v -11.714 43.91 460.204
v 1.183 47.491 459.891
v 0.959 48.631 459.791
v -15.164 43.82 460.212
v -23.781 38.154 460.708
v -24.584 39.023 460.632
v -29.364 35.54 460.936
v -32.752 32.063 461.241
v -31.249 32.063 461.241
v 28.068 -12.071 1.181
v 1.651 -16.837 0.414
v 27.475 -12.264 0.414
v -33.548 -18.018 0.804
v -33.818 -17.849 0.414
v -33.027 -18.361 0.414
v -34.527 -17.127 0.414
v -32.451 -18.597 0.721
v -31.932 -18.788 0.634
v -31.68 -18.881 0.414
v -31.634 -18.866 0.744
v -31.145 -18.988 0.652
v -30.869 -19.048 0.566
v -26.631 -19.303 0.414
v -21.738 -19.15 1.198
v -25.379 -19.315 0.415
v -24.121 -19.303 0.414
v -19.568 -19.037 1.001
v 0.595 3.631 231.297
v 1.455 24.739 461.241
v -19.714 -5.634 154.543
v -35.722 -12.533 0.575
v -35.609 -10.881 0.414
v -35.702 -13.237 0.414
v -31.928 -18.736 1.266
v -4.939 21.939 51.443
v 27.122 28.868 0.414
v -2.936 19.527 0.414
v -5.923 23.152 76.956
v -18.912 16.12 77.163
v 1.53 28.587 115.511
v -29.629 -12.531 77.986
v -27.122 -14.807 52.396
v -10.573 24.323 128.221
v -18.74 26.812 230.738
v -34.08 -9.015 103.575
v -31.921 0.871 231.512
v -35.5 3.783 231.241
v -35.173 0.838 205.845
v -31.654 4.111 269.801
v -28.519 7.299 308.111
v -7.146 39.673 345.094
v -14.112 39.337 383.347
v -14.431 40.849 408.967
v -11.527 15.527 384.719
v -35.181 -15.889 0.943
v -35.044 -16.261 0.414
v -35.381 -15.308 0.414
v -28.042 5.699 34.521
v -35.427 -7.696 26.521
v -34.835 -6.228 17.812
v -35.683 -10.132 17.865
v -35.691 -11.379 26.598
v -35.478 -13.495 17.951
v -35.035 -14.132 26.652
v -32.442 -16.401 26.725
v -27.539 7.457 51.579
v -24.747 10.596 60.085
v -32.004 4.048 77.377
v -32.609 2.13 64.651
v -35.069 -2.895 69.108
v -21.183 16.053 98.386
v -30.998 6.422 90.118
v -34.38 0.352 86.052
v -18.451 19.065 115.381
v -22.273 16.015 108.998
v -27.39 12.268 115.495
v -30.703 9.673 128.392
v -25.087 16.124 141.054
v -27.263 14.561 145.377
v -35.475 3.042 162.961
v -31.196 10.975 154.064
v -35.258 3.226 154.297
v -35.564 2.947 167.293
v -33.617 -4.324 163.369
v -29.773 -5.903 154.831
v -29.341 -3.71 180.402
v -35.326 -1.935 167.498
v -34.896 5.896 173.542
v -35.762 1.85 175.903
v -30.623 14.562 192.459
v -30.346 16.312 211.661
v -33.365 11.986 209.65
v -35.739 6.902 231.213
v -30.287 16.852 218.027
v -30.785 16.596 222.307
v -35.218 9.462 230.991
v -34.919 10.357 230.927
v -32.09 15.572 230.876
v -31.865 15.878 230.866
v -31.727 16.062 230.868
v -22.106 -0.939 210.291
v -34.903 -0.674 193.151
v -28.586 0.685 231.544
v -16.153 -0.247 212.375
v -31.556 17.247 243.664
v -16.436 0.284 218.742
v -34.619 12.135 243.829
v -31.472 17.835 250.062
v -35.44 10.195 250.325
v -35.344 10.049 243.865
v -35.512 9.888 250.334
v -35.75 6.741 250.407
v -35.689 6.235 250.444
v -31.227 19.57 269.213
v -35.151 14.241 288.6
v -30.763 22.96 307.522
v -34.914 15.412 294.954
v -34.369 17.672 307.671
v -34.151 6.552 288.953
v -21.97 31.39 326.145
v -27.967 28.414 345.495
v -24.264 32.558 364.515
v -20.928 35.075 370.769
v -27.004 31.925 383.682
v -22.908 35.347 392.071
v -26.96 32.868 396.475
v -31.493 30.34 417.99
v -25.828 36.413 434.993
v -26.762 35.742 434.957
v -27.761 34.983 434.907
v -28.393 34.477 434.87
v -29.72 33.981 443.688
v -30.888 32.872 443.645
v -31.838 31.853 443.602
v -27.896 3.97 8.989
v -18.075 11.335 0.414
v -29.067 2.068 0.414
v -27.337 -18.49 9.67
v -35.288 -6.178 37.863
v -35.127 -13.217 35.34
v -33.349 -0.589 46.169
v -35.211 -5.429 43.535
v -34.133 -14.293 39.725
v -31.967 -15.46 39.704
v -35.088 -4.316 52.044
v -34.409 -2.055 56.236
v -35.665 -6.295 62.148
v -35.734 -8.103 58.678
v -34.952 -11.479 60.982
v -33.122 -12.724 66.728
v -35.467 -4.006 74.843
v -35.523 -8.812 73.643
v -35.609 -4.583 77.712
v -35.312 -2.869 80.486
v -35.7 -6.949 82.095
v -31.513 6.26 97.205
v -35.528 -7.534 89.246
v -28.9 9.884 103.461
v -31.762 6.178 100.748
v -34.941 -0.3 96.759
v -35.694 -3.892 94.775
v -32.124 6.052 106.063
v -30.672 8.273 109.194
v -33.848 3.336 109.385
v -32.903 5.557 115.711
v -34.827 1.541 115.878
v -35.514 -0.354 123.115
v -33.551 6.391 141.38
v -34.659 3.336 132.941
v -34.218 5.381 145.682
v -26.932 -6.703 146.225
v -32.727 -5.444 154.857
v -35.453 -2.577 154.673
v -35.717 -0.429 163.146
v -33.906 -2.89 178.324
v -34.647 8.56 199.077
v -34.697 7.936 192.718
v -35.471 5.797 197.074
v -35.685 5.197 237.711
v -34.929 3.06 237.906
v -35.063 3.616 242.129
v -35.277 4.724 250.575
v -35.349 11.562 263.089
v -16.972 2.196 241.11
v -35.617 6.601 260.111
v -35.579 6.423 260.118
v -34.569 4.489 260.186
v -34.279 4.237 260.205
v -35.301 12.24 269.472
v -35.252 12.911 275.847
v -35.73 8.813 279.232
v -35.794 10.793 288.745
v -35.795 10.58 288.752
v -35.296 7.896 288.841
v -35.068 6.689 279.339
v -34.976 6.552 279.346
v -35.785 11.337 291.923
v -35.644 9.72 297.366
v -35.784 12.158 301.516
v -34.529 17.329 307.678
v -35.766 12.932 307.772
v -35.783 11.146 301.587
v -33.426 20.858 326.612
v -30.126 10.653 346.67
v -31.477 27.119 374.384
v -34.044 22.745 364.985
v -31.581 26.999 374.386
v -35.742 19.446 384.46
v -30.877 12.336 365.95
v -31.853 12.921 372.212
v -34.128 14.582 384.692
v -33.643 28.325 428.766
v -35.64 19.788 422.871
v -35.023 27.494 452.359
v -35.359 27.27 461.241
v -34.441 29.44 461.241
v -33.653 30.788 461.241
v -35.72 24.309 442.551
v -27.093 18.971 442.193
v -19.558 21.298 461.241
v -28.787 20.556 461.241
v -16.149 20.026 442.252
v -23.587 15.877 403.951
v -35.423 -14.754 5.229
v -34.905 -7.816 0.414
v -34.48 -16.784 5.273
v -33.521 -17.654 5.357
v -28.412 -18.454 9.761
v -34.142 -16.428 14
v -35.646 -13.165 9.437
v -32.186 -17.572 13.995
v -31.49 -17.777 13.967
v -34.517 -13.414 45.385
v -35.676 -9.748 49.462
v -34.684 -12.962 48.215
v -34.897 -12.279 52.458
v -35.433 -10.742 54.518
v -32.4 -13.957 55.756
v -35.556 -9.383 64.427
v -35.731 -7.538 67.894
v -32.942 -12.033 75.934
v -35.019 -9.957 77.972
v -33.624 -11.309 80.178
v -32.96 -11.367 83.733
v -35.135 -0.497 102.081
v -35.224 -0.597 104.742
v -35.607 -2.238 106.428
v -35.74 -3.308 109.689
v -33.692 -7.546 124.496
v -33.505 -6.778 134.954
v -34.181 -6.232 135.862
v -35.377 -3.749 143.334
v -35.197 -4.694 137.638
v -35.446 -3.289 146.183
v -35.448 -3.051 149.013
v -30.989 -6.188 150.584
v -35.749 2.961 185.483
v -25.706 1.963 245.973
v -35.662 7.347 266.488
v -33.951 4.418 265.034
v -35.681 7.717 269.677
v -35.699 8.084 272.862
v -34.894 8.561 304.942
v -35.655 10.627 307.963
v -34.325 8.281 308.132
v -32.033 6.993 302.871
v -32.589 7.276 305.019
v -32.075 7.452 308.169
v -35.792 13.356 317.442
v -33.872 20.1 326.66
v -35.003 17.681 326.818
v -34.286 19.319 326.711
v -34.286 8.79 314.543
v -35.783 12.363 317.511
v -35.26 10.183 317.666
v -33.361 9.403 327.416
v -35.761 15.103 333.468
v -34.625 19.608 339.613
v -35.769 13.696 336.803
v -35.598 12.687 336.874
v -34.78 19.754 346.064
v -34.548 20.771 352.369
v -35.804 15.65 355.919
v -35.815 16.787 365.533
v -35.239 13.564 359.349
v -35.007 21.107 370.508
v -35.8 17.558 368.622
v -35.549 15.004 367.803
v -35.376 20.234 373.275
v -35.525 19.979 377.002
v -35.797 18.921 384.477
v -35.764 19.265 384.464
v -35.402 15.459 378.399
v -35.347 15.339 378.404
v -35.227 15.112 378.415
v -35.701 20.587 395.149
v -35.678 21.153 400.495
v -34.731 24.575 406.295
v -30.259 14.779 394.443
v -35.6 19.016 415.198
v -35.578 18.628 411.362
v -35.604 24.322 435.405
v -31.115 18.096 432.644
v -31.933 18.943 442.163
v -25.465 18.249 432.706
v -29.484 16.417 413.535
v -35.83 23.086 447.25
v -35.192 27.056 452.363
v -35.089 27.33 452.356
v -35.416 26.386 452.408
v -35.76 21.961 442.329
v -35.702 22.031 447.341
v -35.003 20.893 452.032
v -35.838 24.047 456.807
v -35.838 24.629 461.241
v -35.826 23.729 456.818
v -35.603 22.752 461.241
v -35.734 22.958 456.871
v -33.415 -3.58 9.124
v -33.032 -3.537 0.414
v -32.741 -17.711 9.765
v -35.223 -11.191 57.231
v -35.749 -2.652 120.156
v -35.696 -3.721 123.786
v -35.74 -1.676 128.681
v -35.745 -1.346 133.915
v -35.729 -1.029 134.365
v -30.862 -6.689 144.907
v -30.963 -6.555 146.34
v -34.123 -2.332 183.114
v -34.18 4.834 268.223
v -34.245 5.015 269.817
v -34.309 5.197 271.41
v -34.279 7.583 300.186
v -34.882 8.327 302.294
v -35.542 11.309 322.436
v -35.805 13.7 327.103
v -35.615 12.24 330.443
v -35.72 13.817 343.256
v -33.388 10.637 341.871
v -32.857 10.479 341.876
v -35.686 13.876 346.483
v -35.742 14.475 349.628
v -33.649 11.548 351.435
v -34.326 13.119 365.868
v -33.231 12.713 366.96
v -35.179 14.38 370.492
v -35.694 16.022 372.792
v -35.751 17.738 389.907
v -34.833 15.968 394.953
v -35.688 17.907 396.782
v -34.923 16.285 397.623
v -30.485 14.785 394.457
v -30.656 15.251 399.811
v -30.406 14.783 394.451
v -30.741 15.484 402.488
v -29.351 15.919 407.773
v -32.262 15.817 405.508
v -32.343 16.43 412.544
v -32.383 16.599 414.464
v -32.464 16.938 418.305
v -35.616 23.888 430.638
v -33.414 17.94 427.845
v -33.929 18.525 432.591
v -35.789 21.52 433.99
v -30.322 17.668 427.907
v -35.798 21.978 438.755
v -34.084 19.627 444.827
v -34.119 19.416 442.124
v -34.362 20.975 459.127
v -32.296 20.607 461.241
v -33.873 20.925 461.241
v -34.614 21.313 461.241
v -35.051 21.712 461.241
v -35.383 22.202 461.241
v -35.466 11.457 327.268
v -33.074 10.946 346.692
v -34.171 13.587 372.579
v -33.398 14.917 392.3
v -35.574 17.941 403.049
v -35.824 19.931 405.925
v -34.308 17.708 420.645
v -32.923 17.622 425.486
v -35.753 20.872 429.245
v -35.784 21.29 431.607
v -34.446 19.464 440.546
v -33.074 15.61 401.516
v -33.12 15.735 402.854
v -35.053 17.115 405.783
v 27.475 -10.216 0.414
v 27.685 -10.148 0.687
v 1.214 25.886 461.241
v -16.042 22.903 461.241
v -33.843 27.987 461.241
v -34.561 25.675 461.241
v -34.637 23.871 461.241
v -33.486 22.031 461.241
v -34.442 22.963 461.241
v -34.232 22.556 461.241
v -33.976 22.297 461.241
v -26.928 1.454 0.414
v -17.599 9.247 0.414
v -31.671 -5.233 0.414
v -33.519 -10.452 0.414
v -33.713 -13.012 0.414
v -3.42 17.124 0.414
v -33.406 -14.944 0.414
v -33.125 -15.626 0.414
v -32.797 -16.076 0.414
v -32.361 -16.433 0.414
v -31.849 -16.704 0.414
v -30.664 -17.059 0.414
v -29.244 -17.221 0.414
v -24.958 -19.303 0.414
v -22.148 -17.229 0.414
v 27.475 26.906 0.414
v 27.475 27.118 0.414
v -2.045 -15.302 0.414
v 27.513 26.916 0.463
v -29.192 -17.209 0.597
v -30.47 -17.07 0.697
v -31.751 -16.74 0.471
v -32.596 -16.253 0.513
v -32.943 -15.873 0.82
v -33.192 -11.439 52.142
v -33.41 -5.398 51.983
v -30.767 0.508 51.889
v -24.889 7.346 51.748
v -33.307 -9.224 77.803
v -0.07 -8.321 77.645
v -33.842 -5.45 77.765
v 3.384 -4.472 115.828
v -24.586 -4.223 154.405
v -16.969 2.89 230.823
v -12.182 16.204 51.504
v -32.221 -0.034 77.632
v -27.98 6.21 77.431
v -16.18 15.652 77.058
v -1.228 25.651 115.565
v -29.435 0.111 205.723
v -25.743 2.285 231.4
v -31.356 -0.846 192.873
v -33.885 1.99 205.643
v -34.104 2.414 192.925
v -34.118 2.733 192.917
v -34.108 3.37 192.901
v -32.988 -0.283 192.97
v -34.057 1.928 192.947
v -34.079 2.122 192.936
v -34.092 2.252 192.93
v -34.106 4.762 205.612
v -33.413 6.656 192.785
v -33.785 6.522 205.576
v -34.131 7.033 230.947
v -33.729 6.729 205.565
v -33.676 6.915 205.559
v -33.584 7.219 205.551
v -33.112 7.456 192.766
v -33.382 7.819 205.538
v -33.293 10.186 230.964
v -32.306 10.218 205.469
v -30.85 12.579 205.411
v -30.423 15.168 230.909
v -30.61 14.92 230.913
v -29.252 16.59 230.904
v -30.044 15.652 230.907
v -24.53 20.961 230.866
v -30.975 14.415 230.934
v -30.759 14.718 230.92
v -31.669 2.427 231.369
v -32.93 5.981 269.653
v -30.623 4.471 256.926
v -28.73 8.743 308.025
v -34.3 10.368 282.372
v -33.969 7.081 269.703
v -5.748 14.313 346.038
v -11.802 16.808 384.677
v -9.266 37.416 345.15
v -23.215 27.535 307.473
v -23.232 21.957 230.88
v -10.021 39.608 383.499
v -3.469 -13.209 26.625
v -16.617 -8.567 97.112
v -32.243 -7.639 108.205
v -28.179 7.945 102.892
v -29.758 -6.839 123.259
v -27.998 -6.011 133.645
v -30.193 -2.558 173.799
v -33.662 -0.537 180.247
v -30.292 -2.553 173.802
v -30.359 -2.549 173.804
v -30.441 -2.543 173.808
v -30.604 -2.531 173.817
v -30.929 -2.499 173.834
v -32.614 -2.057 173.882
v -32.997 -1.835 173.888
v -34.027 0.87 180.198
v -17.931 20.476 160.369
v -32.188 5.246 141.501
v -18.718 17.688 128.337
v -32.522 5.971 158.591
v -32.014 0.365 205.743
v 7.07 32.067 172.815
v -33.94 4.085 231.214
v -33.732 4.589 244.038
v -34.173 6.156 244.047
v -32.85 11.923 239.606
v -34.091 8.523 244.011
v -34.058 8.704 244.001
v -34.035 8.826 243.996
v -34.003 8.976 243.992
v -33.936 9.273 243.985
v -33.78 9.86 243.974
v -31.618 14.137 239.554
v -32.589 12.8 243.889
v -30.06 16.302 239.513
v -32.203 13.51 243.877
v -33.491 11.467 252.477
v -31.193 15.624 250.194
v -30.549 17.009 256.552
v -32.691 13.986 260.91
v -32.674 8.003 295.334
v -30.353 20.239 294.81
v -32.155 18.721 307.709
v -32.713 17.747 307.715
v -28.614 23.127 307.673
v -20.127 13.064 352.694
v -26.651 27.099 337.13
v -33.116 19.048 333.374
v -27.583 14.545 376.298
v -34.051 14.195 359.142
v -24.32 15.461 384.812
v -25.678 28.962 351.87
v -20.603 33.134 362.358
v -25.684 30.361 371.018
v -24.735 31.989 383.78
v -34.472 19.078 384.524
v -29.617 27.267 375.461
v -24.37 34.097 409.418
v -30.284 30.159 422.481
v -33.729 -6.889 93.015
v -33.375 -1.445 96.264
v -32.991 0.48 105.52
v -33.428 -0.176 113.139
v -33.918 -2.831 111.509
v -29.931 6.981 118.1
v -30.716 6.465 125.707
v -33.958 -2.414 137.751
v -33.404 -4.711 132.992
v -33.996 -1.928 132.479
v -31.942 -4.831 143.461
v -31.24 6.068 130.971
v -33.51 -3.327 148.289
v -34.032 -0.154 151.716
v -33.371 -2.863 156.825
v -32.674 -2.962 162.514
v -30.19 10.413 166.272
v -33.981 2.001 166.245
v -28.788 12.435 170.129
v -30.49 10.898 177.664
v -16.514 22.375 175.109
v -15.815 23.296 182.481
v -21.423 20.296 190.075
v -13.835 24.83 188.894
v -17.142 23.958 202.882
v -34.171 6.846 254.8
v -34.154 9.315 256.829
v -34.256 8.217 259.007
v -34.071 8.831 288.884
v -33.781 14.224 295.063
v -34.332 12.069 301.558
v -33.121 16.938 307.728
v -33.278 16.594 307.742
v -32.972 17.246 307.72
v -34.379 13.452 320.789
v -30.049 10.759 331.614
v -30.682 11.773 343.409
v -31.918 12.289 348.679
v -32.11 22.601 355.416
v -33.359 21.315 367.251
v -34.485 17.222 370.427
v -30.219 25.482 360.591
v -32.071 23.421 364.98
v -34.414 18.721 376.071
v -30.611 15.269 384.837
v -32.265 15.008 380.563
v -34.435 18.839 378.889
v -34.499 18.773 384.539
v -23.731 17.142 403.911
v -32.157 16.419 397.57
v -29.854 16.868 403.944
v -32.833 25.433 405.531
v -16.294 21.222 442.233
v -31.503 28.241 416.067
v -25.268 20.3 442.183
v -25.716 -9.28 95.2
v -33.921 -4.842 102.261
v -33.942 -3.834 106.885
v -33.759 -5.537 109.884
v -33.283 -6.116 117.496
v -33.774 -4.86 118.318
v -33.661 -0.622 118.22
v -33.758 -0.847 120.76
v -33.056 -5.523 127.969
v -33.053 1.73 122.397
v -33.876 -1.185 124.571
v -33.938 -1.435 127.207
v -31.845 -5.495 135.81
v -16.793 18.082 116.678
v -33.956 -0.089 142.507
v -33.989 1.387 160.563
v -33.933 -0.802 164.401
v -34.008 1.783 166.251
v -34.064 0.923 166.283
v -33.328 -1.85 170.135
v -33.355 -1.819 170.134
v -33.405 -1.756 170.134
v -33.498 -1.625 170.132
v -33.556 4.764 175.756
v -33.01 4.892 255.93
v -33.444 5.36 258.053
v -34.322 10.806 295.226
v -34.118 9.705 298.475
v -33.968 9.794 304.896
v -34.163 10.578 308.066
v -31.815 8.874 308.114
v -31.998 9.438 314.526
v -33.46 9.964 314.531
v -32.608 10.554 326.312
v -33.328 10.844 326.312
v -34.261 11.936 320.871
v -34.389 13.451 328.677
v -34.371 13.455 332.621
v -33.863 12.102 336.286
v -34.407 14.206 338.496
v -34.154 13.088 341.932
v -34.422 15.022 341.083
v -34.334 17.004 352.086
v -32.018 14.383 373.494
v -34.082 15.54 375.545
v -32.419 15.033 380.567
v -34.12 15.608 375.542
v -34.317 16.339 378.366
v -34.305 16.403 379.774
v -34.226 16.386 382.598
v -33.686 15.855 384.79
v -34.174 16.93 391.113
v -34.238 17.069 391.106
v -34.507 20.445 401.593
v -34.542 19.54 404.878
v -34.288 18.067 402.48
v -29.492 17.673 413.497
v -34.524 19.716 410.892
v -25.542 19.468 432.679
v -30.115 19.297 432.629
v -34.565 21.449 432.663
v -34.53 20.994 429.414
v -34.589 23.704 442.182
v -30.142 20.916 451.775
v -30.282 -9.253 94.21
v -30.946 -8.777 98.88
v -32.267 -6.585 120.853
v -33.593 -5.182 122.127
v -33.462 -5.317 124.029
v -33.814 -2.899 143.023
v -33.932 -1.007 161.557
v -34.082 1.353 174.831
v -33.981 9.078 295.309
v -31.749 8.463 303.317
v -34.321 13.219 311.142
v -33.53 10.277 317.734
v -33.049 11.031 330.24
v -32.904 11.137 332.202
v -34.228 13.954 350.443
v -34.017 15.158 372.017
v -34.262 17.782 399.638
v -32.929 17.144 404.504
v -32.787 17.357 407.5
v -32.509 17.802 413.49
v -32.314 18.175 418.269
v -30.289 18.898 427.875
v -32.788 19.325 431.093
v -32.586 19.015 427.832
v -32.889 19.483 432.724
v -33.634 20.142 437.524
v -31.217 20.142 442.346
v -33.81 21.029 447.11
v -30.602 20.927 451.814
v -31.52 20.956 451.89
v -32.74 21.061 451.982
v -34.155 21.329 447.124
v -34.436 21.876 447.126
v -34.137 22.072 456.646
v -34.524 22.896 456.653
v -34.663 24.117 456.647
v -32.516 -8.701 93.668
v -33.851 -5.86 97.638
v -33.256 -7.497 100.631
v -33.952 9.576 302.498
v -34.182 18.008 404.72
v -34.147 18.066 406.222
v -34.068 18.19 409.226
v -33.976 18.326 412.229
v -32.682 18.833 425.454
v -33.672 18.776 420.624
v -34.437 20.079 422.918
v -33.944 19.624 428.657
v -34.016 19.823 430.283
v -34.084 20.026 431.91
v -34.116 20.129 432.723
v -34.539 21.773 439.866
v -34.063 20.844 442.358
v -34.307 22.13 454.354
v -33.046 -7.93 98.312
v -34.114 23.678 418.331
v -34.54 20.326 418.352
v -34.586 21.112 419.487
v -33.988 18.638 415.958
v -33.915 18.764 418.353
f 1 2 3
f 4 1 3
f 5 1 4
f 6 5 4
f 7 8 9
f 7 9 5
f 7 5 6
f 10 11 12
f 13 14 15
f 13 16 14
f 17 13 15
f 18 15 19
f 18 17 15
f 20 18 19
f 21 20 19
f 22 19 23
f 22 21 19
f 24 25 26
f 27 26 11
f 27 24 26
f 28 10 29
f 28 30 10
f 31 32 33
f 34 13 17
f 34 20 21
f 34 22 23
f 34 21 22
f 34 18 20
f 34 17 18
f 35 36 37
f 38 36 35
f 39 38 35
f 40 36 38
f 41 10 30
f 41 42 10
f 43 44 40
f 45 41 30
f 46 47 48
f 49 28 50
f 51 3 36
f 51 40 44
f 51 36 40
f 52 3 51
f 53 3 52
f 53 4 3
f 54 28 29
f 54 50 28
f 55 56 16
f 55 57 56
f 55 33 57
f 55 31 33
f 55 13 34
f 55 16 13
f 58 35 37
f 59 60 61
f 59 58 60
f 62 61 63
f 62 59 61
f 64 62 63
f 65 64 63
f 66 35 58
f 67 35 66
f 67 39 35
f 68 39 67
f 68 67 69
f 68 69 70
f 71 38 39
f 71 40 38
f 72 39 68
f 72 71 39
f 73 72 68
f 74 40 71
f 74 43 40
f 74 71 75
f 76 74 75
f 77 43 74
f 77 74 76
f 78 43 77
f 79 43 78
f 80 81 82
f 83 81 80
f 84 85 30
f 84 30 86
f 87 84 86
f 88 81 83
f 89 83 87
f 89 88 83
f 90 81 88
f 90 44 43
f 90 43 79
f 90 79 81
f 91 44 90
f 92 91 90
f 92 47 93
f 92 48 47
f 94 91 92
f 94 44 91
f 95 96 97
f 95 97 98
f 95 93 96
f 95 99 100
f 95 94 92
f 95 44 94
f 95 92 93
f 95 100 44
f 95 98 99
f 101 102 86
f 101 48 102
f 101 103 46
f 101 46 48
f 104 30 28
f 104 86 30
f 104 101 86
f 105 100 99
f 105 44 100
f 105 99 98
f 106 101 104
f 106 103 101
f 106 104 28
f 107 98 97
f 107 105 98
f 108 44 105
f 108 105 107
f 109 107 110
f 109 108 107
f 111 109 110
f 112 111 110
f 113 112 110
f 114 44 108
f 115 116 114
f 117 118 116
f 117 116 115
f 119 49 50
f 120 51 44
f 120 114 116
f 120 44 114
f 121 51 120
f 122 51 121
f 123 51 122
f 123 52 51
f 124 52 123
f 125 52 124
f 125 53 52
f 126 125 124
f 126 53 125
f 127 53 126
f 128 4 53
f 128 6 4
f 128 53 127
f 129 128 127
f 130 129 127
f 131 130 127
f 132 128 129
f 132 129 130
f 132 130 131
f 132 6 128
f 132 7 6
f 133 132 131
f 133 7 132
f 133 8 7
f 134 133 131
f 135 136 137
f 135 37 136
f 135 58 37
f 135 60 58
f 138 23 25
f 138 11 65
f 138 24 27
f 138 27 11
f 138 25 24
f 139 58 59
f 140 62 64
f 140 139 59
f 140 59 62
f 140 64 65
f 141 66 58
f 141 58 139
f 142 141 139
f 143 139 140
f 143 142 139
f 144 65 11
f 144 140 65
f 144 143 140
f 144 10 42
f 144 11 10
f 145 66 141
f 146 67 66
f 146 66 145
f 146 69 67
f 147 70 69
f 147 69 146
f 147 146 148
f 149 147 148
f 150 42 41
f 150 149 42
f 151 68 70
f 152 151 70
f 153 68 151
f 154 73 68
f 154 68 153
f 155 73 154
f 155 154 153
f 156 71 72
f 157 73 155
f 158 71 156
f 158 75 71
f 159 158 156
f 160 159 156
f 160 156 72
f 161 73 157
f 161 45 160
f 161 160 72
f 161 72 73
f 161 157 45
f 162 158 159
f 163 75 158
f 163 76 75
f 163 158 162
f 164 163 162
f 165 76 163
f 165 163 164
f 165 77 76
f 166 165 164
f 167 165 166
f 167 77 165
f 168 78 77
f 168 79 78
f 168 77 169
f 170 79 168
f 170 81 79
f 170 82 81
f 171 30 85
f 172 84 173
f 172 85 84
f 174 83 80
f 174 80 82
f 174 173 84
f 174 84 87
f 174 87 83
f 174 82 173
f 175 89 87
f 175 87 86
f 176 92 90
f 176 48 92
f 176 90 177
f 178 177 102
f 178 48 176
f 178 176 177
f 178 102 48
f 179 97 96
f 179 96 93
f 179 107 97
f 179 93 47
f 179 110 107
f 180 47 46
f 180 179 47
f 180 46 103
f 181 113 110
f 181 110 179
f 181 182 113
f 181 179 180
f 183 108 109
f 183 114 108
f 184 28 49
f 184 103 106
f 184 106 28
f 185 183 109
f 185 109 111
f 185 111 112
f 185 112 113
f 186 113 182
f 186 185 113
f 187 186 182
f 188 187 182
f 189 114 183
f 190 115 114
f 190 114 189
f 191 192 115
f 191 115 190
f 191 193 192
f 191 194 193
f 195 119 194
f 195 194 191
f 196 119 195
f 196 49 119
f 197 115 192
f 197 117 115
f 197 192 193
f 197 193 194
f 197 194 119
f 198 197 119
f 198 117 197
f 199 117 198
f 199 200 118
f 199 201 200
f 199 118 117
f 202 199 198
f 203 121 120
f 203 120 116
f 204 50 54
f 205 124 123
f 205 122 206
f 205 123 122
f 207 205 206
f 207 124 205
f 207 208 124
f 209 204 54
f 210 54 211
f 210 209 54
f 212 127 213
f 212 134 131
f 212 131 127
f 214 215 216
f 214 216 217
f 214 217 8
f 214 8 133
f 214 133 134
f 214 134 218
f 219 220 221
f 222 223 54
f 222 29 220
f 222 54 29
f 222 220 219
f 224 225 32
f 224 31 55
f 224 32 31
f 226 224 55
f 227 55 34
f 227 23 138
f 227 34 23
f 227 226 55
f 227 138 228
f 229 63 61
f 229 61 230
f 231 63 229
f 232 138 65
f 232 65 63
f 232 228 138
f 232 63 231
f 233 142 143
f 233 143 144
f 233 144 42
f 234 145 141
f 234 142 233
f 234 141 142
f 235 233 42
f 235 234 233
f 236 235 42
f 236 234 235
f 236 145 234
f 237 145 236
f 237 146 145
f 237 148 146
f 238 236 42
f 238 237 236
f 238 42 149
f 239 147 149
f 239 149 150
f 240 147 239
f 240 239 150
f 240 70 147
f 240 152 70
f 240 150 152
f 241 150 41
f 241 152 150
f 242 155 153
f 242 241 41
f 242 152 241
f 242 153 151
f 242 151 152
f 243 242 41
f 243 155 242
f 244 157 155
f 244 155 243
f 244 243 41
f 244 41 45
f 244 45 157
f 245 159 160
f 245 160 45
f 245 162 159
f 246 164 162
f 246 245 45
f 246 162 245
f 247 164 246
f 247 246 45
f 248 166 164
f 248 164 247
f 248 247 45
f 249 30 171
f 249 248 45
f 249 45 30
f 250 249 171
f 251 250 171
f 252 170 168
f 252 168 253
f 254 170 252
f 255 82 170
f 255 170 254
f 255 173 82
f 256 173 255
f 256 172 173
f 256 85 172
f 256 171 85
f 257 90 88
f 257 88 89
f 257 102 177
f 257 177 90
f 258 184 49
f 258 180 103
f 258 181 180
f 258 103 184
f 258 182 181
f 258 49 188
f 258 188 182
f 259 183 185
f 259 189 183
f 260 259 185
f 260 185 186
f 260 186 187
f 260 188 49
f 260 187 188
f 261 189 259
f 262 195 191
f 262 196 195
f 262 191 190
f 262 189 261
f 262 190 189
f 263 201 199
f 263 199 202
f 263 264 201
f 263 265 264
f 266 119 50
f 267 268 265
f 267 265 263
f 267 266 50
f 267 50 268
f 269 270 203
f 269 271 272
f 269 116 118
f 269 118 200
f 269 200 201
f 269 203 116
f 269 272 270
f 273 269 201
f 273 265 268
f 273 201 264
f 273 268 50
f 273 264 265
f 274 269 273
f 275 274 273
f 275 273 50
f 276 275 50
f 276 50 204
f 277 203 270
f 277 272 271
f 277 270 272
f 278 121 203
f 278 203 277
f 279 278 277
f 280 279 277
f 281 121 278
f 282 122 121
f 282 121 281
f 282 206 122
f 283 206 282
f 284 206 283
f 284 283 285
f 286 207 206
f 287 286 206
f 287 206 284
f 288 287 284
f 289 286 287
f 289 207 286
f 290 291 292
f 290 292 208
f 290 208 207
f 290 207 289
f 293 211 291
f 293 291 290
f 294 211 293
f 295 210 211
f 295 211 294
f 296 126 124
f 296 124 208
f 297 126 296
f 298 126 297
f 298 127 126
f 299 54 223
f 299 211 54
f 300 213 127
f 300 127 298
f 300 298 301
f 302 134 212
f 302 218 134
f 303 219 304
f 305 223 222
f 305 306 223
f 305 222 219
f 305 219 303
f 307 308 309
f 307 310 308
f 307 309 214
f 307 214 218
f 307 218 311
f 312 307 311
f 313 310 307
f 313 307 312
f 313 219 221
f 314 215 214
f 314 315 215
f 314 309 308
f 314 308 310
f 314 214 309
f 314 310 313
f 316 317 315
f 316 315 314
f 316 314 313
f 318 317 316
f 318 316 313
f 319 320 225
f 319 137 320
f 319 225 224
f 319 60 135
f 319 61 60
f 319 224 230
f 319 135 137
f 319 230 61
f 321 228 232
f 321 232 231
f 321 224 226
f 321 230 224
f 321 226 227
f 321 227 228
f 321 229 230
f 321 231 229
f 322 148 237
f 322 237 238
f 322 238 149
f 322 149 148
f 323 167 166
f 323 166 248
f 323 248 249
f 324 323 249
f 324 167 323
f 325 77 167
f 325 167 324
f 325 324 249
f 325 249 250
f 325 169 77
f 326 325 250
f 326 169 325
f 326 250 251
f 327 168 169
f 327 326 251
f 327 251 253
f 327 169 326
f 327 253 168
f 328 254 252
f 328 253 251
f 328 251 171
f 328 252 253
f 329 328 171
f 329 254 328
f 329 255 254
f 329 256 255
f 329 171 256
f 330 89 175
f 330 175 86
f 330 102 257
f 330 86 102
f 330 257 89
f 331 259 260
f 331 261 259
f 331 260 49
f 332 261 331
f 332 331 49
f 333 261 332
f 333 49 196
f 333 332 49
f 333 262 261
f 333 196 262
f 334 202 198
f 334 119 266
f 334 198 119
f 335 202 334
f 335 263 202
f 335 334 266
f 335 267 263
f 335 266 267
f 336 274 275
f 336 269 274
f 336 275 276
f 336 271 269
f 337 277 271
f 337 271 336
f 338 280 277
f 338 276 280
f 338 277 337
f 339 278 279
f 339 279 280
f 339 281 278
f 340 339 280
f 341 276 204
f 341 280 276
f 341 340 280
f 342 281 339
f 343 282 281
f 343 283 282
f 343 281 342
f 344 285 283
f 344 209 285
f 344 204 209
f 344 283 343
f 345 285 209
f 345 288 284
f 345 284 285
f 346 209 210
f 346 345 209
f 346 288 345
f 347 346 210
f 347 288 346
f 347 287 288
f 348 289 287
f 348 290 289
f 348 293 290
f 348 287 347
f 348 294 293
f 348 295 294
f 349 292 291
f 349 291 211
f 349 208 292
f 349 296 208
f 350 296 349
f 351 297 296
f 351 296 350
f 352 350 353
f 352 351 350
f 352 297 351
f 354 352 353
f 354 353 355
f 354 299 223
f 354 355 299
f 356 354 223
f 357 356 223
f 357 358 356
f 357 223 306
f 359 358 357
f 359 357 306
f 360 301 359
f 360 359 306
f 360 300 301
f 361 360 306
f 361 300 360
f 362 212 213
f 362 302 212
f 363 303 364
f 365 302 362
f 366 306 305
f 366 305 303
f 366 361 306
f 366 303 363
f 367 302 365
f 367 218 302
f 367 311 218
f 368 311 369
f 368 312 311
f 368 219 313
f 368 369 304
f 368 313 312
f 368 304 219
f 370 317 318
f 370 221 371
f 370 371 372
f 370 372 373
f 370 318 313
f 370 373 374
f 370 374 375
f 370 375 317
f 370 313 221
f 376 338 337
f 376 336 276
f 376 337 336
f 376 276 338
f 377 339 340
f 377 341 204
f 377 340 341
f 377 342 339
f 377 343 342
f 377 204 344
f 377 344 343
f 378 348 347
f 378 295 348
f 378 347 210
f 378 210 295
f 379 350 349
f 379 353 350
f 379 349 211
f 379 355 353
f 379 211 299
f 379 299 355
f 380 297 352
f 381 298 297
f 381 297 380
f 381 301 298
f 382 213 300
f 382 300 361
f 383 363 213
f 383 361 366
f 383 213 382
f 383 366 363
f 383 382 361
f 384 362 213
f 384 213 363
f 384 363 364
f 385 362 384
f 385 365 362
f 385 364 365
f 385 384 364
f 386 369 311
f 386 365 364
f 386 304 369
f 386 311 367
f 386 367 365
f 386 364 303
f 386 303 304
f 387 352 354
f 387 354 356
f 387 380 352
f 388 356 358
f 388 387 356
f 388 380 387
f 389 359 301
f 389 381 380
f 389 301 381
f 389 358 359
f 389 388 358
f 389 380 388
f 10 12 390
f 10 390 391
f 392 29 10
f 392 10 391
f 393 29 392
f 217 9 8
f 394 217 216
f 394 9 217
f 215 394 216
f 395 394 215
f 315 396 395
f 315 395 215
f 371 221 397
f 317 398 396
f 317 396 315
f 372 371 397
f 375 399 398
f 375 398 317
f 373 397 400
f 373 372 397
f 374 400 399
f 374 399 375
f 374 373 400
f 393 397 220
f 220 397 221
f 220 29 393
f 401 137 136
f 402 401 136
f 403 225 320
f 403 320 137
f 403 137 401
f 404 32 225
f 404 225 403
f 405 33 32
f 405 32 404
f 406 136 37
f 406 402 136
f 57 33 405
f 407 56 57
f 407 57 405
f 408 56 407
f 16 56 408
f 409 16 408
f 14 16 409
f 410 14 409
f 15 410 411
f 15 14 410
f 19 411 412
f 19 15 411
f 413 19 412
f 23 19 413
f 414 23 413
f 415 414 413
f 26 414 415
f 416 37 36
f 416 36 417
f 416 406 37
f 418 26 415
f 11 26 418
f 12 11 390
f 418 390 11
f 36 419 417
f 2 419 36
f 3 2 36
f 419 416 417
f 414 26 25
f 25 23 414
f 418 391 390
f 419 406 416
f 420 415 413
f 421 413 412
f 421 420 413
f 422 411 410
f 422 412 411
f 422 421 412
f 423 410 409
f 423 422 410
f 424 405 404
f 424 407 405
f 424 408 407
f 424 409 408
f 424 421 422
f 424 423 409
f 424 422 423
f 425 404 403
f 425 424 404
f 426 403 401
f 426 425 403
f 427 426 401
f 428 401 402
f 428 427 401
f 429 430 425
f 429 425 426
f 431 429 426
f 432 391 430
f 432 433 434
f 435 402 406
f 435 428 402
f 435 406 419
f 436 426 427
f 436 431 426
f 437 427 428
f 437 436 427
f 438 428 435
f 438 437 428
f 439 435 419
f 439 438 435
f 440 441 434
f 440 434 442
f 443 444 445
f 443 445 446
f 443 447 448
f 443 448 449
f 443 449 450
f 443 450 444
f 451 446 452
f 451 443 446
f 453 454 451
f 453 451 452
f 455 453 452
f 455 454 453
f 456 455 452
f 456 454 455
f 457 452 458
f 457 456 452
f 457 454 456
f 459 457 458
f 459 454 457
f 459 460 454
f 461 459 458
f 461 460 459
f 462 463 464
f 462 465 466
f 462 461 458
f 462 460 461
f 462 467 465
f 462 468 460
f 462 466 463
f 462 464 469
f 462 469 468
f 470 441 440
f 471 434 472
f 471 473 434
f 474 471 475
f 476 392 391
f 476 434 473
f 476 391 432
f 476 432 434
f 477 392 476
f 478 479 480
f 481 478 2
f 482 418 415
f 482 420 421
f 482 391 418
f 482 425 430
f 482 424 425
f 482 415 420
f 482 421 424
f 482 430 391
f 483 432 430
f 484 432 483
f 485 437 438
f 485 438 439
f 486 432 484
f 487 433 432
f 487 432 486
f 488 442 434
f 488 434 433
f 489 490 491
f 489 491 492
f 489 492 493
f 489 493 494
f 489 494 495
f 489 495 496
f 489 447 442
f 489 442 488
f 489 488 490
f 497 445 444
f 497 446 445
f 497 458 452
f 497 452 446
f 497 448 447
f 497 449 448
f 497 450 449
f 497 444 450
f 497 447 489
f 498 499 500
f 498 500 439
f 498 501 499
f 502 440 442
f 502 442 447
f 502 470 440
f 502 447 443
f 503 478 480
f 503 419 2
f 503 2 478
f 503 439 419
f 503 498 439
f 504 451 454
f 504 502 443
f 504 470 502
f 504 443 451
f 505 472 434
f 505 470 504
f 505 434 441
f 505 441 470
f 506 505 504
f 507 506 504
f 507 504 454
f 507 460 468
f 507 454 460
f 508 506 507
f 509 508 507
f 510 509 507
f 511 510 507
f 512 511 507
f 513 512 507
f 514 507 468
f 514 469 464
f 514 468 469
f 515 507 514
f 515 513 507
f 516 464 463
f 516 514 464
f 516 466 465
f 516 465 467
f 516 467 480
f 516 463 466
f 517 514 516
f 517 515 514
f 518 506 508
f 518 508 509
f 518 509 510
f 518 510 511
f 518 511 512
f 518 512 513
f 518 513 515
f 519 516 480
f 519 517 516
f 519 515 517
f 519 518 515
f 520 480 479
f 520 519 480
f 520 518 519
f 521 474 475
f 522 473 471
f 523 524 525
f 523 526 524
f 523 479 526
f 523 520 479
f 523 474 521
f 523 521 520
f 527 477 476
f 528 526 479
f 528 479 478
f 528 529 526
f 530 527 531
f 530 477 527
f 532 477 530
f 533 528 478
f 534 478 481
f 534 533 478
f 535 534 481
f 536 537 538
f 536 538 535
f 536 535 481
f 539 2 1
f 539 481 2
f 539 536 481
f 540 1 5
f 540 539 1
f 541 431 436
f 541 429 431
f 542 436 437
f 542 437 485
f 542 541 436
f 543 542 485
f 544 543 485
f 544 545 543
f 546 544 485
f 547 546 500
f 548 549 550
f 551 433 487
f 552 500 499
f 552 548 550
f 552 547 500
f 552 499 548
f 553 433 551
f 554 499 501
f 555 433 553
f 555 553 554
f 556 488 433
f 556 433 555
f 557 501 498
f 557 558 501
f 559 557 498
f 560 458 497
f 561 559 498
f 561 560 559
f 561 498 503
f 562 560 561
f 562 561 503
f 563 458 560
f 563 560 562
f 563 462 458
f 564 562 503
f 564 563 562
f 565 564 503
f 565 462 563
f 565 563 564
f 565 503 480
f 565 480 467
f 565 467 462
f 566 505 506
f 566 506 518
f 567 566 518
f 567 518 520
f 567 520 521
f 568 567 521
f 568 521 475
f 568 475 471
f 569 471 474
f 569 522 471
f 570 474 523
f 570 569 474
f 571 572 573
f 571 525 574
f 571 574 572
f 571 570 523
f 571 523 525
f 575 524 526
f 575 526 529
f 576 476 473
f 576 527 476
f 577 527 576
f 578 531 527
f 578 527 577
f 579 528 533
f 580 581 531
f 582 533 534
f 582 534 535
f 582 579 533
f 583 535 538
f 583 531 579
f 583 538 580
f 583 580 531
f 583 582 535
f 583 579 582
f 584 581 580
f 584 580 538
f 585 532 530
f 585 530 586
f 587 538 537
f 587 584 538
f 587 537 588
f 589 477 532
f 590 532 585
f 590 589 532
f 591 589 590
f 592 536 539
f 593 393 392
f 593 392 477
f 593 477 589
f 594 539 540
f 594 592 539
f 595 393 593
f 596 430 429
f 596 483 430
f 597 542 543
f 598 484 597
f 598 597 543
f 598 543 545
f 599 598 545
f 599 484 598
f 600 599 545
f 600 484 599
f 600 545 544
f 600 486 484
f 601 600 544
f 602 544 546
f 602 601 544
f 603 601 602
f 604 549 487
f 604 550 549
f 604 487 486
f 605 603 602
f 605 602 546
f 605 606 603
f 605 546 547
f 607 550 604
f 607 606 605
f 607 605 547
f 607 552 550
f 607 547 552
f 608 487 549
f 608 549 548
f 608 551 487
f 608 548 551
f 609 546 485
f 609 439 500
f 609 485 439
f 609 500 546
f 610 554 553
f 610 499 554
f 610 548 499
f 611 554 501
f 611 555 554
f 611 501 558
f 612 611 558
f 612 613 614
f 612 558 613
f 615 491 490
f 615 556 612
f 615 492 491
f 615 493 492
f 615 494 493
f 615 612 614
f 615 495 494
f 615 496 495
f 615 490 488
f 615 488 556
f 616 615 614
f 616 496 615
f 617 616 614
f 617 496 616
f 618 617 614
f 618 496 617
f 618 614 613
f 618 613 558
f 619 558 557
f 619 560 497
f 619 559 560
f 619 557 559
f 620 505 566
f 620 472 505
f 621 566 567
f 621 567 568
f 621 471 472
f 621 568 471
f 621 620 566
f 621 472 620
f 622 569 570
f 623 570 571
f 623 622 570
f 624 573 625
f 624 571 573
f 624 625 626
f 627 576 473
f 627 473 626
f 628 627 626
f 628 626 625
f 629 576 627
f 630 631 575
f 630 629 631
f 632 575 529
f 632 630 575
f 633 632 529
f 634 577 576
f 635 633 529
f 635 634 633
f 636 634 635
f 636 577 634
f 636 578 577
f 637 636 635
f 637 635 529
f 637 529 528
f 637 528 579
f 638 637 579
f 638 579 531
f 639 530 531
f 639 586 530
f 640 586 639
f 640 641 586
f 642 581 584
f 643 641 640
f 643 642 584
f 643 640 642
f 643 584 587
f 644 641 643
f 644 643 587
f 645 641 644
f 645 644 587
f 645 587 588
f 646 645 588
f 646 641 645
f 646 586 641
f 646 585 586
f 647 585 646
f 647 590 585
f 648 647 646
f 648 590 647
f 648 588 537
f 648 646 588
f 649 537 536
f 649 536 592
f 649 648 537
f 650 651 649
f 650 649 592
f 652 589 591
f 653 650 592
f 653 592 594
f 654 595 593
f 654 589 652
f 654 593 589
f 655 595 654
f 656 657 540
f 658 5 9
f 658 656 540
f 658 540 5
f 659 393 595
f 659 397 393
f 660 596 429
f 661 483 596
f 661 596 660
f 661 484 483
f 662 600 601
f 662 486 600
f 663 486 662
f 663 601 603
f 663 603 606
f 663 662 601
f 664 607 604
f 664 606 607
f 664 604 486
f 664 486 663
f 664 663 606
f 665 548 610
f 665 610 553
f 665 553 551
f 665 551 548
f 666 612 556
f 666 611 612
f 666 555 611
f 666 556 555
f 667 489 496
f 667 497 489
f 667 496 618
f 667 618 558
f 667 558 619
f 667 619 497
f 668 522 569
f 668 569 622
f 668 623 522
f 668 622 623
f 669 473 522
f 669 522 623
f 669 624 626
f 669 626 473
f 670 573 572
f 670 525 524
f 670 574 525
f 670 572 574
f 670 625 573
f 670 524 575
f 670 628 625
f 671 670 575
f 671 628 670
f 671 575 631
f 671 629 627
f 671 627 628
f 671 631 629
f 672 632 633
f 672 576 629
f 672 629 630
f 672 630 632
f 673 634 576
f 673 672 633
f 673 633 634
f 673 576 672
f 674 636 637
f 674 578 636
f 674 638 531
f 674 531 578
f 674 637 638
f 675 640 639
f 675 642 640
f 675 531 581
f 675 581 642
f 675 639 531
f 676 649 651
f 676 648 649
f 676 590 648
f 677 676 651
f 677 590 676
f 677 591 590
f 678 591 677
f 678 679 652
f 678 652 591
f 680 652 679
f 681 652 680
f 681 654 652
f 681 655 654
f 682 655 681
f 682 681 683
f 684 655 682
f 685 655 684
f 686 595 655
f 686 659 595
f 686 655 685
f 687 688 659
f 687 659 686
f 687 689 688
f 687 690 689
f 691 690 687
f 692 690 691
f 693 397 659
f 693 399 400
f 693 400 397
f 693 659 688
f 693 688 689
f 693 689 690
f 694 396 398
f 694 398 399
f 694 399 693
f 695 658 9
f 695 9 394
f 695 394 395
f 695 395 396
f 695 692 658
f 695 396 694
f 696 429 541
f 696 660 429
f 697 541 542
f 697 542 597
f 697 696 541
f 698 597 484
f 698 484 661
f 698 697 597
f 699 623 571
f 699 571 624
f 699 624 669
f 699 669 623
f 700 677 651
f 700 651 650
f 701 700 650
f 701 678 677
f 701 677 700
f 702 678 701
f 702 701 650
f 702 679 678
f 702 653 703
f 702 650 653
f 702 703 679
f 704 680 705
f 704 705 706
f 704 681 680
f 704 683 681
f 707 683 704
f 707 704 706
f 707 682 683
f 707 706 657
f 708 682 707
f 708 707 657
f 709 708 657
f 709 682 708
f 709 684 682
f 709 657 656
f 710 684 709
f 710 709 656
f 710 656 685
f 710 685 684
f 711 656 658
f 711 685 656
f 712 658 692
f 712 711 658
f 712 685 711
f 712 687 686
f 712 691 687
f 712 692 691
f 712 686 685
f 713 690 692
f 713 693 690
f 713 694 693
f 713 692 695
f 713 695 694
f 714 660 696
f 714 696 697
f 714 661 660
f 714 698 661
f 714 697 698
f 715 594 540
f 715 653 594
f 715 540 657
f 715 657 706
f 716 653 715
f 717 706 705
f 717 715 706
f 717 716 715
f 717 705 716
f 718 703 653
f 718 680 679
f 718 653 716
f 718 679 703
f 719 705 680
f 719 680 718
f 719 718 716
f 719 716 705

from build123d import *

# Parameters (mm, degrees)
CUT_EXTRUDE5_DEPTH      = 467.171820203
CUT_EXTRUDE5_DEPTH_BACK = 467.171820203


with BuildPart() as part:
    # Boundary1: read off the stored shape, not the designer's step
    # Boundary1: loft between two sections, ruled curve by curve
    boundary1_from = [
        Edge.make_bspline([(27.746461368, -10.231582557, -0.37970371), (24.54048865, -10.88648923, -0.3224068), (18.322219711, -12.153767625, -0.211534307), (9.311879161, -13.768668652, -0.070248775), (0.965035467, -14.962763473, 0.034220985), (-6.604009298, -15.908371944, 0.116951007), (-13.358041741, -16.623063146, 0.179478385), (-19.228055617, -17.091792561, 0.220486895), (-24.147885132, -17.37038488, 0.244860564), (-28.064249619, -17.286606019, 0.237530864), (-30.927663742, -17.184111401, 0.228563747), (-33.069779251, -16.204477975, 0.142856927), (-33.670245564, -14.180380357, -0.034228668), (-33.79784861, -11.966277347, -0.227937581), (-33.330465654, -9.339970934, -0.457709619), (-32.313062195, -6.487599721, -0.707259765), (-30.705815178, -3.476068737, -0.970734586), (-28.516579872, -0.373222201, -1.242198482), (-25.653586837, 2.727393202, -1.51346718), (-22.130293772, 5.79908064, -1.782205009), (-17.998850338, 8.874134437, -2.051237356), (-13.260099319, 11.888557643, -2.314965213), (-7.943462931, 14.801976598, -2.569856344), (-2.077633941, 17.581693253, -2.813050039), (4.319210231, 20.172647346, -3.03972915), (11.207289388, 22.560882395, -3.248672642), (19.047405598, 24.834293744, -3.447570363), (24.631685242, 26.123911427, -3.560397291), (27.746461368, 26.733720257, -3.61374865)], [0, 0, 0, 0, 0.069142211, 0.134093926, 0.193382849, 0.247272805, 0.29525533, 0.336863889, 0.371680257, 0.39933975, 0.419456898, 0.432512713, 0.445408835, 0.461295234, 0.479930086, 0.501308052, 0.525350586, 0.552013073, 0.581539338, 0.614461538, 0.650800476, 0.69040154, 0.733149242, 0.778919637, 0.827558387, 0.878968086, 0.932940996, 1, 1, 1, 1], 3),
        Edge.make_bspline([(27.360981111, 28.687716483, -3.784701168), (24.418912176, 28.111720153, -3.734308019), (18.568950334, 26.774993221, -3.617359566), (9.931603873, 24.271530826, -3.398334987), (1.454173497, 21.248858509, -3.133885426), (-6.825266824, 17.649092208, -2.818946683), (-13.476961936, 14.097742153, -2.508243813), (-18.595650936, 10.855460073, -2.224580887), (-22.295577191, 8.189990235, -1.991382494), (-25.829788091, 5.2796825, -1.736763559), (-29.147742681, 1.998580964, -1.449704371), (-31.555461477, -1.135032916, -1.175548681), (-33.181527352, -3.844071716, -0.938538497), (-34.240367025, -6.002821132, -0.749672395), (-35.079614705, -8.291167612, -0.54946802), (-35.557667228, -10.322301427, -0.371766837), (-35.732624245, -12.044184646, -0.221121576), (-35.721862376, -13.37712306, -0.104504575), (-35.582262474, -14.479538884, -0.008055688), (-35.368251029, -15.436490393, 0.07566672), (-35.0906666, -16.242838807, 0.146213065), (-34.612779787, -17.109226433, 0.222012161), (-33.836646855, -17.896788857, 0.290914945), (-33.042092756, -18.3852358, 0.333648515), (-32.003372281, -18.824617033, 0.372089392), (-30.818177722, -19.102451519, 0.39639676), (-29.490238689, -19.231378803, 0.407676436), (-28.340965262, -19.26258139, 0.410406308), (-26.85641179, -19.303547365, 0.413990367), (-24.952158992, -19.327749266, 0.416107759), (-22.656109383, -19.271609205, 0.41119614), (-20.398107438, -19.14823427, 0.400402231), (-18.167525907, -18.995496212, 0.387039383), (-15.192679466, -18.766498595, 0.367004687), (-11.479797979, -18.427372101, 0.337334964), (-7.040502934, -17.948902242, 0.295474275), (-2.6127621, -17.418521591, 0.249071981), (3.278252149, -16.651200192, 0.181940057), (10.649779589, -15.568979876, 0.087258048), (19.442358508, -13.958032163, -0.053681614), (25.243200231, -12.775750709, -0.157117839), (28.148011567, -12.182364396, -0.209032414)], [0, 0, 0, 0, 0.0625, 0.125, 0.1875, 0.25, 0.3125, 0.34375, 0.375, 0.40625, 0.4375, 0.46875, 0.484375, 0.5, 0.515625, 0.53125, 0.5390625, 0.546875, 0.5546875, 0.55859375, 0.5625, 0.56640625, 0.5703125, 0.57421875, 0.578125, 0.5859375, 0.59375, 0.6015625, 0.609375, 0.625, 0.640625, 0.65625, 0.671875, 0.6875, 0.71875, 0.75, 0.78125, 0.8125, 0.875, 0.9375, 1, 1, 1, 1], 3),
        Edge.make_line((28.148011567, -12.182364396, -0.209032414), (27.746461368, -10.231582557, -0.37970371)),
        Edge.make_line((27.746461368, 26.733720257, -3.61374865), (27.360981111, 28.687716483, -3.784701168)),
    ]
    boundary1_to = [
        Edge.make_bspline([(1.183457689, 25.927911818, 461.777436147), (-0.686693063, 25.545882925, 461.810859344), (-4.314016611, 24.806637194, 461.875534965), (-9.570048598, 23.864611595, 461.957951526), (-14.439040753, 23.168056283, 462.018892219), (-18.854316866, 22.616451342, 462.067151398), (-22.794169125, 22.199548141, 462.103625702), (-26.218343885, 21.926122649, 462.127547333), (-29.088244436, 21.763610462, 462.141765307), (-31.372790386, 21.812481465, 462.137489648), (-33.043115292, 21.872269991, 462.13225883), (-34.292682672, 22.443722824, 462.082263185), (-34.642954688, 23.624446434, 461.978963255), (-34.717389798, 24.916006523, 461.865966388), (-34.44474974, 26.448018598, 461.7319327), (-33.851264389, 28.111901805, 461.586361781), (-32.913703629, 29.868628212, 461.432668136), (-31.636649701, 31.678622025, 461.274314196), (-29.96657043, 33.487314343, 461.116074123), (-27.911316142, 35.279132015, 460.959310389), (-25.501307472, 37.072913397, 460.802374853), (-22.737036045, 38.831326934, 460.648533603), (-19.635664819, 40.530821325, 460.49984711), (-16.213931241, 42.152322706, 460.357984121), (-12.482438807, 43.663712594, 460.22575464), (-8.464392632, 45.056849706, 460.103870936), (-3.89099151, 46.383006326, 459.987847266), (-0.633495051, 47.135283308, 459.922031558), (1.183457689, 47.491005126, 459.890909932)], [0, 0, 0, 0, 0.069142211, 0.134093926, 0.193382849, 0.247272805, 0.29525533, 0.336863889, 0.371680257, 0.39933975, 0.419456898, 0.432512713, 0.445408835, 0.461295234, 0.479930086, 0.501308052, 0.525350586, 0.552013073, 0.581539338, 0.614461538, 0.650800476, 0.69040154, 0.733149242, 0.778919637, 0.827558387, 0.878968086, 0.932940996, 1, 1, 1, 1], 3),
        Edge.make_bspline([(0.958594206, 48.630836257, 459.791187629), (-0.757612673, 48.294838398, 459.820583633), (-4.170090414, 47.515081021, 459.888803564), (-9.208542516, 46.054727957, 460.016567902), (-14.153710236, 44.291502439, 460.170830146), (-18.983383756, 42.191638763, 460.354544412), (-22.863539238, 40.120017898, 460.535787753), (-25.849441155, 38.228686685, 460.701257793), (-28.00773147, 36.673829279, 460.83729019), (-30.069354495, 34.976149767, 460.985817901), (-32.004828006, 33.062173871, 461.153269094), (-33.409330637, 31.234232441, 461.313193247), (-34.357869064, 29.653959808, 461.451449188), (-34.97552554, 28.394689315, 461.56162108), (-35.465086687, 27.059820535, 461.678406966), (-35.743950659, 25.874992476, 461.782065989), (-35.846008918, 24.870560599, 461.869942392), (-35.839731162, 24.093013191, 461.937968975), (-35.758297885, 23.449937293, 461.994230826), (-35.633457875, 22.89171558, 462.043068898), (-35.471533625, 22.421345671, 462.084220932), (-35.192766318, 21.91595289, 462.128437071), (-34.740022107, 21.456541476, 462.168630362), (-34.276532216, 21.171614092, 462.193558278), (-33.67061194, 20.915308373, 462.215982123), (-32.979248447, 20.753238256, 462.230161421), (-32.204617344, 20.678030674, 462.236741232), (-31.534207845, 20.659829165, 462.238333657), (-30.668218319, 20.635932346, 462.240424358), (-29.557404187, 20.62181457, 462.241659503), (-28.218041916, 20.654562939, 462.238794392), (-26.900874114, 20.726531652, 462.232497946), (-25.599701555, 20.815628852, 462.224702951), (-23.864374464, 20.949210795, 462.213016045), (-21.69852693, 21.147034583, 462.195708706), (-19.108938154, 21.426142001, 462.171289971), (-16.526089334, 21.735530714, 462.144221966), (-13.089664355, 22.183134864, 462.105061678), (-8.789606682, 22.814430048, 462.049830506), (-3.660602312, 23.754149547, 461.967615702), (-0.276777974, 24.443813728, 461.907277905), (1.417695305, 24.789955744, 461.876994403)], [0, 0, 0, 0, 0.0625, 0.125, 0.1875, 0.25, 0.3125, 0.34375, 0.375, 0.40625, 0.4375, 0.46875, 0.484375, 0.5, 0.515625, 0.53125, 0.5390625, 0.546875, 0.5546875, 0.55859375, 0.5625, 0.56640625, 0.5703125, 0.57421875, 0.578125, 0.5859375, 0.59375, 0.6015625, 0.609375, 0.625, 0.640625, 0.65625, 0.671875, 0.6875, 0.71875, 0.75, 0.78125, 0.8125, 0.875, 0.9375, 1, 1, 1, 1], 3),
        Edge.make_line((1.417695305, 24.789955744, 461.876994403), (1.183457689, 25.927911818, 461.777436147)),
        Edge.make_line((1.183457689, 47.491005126, 459.890909932), (0.958594206, 48.630836257, 459.791187629)),
    ]
    boundary1 = Solid(Shell([*[Face.make_surface_from_curves(boundary1_from[k], boundary1_to[k]) for k in range(4)], Face(Wire(boundary1_from)), Face(Wire(boundary1_to))]))
    add(boundary1)

    # Sketch5 → Cut-Extrude5 (cut, two sides: drawn at the far end of the back side and taken through both)
    with BuildSketch(Plane(origin=(0, 0, 0), x_dir=(1, 0, 0), z_dir=(0, 1, 0)).offset(-CUT_EXTRUDE5_DEPTH_BACK)):
        Polygon((-35.721546653, -0.413960836), (27.474589662, -0.413960836), (28.624276546, -1.901938856), (28.624276546, 5.514944665), (-37.390121525, 5.514944665), (-37.390121525, -0.413960836), align=None)
        Polygon((-35.721546653, -467.169587901), (27.474589662, -467.169587901), (28.624276546, -468.657565921), (28.624276546, -461.2406824), (-37.390121525, -461.2406824), (-37.390121525, -467.169587901), align=None)
    extrude(amount=CUT_EXTRUDE5_DEPTH + CUT_EXTRUDE5_DEPTH_BACK, mode=Mode.SUBTRACT)


solid = part.part
